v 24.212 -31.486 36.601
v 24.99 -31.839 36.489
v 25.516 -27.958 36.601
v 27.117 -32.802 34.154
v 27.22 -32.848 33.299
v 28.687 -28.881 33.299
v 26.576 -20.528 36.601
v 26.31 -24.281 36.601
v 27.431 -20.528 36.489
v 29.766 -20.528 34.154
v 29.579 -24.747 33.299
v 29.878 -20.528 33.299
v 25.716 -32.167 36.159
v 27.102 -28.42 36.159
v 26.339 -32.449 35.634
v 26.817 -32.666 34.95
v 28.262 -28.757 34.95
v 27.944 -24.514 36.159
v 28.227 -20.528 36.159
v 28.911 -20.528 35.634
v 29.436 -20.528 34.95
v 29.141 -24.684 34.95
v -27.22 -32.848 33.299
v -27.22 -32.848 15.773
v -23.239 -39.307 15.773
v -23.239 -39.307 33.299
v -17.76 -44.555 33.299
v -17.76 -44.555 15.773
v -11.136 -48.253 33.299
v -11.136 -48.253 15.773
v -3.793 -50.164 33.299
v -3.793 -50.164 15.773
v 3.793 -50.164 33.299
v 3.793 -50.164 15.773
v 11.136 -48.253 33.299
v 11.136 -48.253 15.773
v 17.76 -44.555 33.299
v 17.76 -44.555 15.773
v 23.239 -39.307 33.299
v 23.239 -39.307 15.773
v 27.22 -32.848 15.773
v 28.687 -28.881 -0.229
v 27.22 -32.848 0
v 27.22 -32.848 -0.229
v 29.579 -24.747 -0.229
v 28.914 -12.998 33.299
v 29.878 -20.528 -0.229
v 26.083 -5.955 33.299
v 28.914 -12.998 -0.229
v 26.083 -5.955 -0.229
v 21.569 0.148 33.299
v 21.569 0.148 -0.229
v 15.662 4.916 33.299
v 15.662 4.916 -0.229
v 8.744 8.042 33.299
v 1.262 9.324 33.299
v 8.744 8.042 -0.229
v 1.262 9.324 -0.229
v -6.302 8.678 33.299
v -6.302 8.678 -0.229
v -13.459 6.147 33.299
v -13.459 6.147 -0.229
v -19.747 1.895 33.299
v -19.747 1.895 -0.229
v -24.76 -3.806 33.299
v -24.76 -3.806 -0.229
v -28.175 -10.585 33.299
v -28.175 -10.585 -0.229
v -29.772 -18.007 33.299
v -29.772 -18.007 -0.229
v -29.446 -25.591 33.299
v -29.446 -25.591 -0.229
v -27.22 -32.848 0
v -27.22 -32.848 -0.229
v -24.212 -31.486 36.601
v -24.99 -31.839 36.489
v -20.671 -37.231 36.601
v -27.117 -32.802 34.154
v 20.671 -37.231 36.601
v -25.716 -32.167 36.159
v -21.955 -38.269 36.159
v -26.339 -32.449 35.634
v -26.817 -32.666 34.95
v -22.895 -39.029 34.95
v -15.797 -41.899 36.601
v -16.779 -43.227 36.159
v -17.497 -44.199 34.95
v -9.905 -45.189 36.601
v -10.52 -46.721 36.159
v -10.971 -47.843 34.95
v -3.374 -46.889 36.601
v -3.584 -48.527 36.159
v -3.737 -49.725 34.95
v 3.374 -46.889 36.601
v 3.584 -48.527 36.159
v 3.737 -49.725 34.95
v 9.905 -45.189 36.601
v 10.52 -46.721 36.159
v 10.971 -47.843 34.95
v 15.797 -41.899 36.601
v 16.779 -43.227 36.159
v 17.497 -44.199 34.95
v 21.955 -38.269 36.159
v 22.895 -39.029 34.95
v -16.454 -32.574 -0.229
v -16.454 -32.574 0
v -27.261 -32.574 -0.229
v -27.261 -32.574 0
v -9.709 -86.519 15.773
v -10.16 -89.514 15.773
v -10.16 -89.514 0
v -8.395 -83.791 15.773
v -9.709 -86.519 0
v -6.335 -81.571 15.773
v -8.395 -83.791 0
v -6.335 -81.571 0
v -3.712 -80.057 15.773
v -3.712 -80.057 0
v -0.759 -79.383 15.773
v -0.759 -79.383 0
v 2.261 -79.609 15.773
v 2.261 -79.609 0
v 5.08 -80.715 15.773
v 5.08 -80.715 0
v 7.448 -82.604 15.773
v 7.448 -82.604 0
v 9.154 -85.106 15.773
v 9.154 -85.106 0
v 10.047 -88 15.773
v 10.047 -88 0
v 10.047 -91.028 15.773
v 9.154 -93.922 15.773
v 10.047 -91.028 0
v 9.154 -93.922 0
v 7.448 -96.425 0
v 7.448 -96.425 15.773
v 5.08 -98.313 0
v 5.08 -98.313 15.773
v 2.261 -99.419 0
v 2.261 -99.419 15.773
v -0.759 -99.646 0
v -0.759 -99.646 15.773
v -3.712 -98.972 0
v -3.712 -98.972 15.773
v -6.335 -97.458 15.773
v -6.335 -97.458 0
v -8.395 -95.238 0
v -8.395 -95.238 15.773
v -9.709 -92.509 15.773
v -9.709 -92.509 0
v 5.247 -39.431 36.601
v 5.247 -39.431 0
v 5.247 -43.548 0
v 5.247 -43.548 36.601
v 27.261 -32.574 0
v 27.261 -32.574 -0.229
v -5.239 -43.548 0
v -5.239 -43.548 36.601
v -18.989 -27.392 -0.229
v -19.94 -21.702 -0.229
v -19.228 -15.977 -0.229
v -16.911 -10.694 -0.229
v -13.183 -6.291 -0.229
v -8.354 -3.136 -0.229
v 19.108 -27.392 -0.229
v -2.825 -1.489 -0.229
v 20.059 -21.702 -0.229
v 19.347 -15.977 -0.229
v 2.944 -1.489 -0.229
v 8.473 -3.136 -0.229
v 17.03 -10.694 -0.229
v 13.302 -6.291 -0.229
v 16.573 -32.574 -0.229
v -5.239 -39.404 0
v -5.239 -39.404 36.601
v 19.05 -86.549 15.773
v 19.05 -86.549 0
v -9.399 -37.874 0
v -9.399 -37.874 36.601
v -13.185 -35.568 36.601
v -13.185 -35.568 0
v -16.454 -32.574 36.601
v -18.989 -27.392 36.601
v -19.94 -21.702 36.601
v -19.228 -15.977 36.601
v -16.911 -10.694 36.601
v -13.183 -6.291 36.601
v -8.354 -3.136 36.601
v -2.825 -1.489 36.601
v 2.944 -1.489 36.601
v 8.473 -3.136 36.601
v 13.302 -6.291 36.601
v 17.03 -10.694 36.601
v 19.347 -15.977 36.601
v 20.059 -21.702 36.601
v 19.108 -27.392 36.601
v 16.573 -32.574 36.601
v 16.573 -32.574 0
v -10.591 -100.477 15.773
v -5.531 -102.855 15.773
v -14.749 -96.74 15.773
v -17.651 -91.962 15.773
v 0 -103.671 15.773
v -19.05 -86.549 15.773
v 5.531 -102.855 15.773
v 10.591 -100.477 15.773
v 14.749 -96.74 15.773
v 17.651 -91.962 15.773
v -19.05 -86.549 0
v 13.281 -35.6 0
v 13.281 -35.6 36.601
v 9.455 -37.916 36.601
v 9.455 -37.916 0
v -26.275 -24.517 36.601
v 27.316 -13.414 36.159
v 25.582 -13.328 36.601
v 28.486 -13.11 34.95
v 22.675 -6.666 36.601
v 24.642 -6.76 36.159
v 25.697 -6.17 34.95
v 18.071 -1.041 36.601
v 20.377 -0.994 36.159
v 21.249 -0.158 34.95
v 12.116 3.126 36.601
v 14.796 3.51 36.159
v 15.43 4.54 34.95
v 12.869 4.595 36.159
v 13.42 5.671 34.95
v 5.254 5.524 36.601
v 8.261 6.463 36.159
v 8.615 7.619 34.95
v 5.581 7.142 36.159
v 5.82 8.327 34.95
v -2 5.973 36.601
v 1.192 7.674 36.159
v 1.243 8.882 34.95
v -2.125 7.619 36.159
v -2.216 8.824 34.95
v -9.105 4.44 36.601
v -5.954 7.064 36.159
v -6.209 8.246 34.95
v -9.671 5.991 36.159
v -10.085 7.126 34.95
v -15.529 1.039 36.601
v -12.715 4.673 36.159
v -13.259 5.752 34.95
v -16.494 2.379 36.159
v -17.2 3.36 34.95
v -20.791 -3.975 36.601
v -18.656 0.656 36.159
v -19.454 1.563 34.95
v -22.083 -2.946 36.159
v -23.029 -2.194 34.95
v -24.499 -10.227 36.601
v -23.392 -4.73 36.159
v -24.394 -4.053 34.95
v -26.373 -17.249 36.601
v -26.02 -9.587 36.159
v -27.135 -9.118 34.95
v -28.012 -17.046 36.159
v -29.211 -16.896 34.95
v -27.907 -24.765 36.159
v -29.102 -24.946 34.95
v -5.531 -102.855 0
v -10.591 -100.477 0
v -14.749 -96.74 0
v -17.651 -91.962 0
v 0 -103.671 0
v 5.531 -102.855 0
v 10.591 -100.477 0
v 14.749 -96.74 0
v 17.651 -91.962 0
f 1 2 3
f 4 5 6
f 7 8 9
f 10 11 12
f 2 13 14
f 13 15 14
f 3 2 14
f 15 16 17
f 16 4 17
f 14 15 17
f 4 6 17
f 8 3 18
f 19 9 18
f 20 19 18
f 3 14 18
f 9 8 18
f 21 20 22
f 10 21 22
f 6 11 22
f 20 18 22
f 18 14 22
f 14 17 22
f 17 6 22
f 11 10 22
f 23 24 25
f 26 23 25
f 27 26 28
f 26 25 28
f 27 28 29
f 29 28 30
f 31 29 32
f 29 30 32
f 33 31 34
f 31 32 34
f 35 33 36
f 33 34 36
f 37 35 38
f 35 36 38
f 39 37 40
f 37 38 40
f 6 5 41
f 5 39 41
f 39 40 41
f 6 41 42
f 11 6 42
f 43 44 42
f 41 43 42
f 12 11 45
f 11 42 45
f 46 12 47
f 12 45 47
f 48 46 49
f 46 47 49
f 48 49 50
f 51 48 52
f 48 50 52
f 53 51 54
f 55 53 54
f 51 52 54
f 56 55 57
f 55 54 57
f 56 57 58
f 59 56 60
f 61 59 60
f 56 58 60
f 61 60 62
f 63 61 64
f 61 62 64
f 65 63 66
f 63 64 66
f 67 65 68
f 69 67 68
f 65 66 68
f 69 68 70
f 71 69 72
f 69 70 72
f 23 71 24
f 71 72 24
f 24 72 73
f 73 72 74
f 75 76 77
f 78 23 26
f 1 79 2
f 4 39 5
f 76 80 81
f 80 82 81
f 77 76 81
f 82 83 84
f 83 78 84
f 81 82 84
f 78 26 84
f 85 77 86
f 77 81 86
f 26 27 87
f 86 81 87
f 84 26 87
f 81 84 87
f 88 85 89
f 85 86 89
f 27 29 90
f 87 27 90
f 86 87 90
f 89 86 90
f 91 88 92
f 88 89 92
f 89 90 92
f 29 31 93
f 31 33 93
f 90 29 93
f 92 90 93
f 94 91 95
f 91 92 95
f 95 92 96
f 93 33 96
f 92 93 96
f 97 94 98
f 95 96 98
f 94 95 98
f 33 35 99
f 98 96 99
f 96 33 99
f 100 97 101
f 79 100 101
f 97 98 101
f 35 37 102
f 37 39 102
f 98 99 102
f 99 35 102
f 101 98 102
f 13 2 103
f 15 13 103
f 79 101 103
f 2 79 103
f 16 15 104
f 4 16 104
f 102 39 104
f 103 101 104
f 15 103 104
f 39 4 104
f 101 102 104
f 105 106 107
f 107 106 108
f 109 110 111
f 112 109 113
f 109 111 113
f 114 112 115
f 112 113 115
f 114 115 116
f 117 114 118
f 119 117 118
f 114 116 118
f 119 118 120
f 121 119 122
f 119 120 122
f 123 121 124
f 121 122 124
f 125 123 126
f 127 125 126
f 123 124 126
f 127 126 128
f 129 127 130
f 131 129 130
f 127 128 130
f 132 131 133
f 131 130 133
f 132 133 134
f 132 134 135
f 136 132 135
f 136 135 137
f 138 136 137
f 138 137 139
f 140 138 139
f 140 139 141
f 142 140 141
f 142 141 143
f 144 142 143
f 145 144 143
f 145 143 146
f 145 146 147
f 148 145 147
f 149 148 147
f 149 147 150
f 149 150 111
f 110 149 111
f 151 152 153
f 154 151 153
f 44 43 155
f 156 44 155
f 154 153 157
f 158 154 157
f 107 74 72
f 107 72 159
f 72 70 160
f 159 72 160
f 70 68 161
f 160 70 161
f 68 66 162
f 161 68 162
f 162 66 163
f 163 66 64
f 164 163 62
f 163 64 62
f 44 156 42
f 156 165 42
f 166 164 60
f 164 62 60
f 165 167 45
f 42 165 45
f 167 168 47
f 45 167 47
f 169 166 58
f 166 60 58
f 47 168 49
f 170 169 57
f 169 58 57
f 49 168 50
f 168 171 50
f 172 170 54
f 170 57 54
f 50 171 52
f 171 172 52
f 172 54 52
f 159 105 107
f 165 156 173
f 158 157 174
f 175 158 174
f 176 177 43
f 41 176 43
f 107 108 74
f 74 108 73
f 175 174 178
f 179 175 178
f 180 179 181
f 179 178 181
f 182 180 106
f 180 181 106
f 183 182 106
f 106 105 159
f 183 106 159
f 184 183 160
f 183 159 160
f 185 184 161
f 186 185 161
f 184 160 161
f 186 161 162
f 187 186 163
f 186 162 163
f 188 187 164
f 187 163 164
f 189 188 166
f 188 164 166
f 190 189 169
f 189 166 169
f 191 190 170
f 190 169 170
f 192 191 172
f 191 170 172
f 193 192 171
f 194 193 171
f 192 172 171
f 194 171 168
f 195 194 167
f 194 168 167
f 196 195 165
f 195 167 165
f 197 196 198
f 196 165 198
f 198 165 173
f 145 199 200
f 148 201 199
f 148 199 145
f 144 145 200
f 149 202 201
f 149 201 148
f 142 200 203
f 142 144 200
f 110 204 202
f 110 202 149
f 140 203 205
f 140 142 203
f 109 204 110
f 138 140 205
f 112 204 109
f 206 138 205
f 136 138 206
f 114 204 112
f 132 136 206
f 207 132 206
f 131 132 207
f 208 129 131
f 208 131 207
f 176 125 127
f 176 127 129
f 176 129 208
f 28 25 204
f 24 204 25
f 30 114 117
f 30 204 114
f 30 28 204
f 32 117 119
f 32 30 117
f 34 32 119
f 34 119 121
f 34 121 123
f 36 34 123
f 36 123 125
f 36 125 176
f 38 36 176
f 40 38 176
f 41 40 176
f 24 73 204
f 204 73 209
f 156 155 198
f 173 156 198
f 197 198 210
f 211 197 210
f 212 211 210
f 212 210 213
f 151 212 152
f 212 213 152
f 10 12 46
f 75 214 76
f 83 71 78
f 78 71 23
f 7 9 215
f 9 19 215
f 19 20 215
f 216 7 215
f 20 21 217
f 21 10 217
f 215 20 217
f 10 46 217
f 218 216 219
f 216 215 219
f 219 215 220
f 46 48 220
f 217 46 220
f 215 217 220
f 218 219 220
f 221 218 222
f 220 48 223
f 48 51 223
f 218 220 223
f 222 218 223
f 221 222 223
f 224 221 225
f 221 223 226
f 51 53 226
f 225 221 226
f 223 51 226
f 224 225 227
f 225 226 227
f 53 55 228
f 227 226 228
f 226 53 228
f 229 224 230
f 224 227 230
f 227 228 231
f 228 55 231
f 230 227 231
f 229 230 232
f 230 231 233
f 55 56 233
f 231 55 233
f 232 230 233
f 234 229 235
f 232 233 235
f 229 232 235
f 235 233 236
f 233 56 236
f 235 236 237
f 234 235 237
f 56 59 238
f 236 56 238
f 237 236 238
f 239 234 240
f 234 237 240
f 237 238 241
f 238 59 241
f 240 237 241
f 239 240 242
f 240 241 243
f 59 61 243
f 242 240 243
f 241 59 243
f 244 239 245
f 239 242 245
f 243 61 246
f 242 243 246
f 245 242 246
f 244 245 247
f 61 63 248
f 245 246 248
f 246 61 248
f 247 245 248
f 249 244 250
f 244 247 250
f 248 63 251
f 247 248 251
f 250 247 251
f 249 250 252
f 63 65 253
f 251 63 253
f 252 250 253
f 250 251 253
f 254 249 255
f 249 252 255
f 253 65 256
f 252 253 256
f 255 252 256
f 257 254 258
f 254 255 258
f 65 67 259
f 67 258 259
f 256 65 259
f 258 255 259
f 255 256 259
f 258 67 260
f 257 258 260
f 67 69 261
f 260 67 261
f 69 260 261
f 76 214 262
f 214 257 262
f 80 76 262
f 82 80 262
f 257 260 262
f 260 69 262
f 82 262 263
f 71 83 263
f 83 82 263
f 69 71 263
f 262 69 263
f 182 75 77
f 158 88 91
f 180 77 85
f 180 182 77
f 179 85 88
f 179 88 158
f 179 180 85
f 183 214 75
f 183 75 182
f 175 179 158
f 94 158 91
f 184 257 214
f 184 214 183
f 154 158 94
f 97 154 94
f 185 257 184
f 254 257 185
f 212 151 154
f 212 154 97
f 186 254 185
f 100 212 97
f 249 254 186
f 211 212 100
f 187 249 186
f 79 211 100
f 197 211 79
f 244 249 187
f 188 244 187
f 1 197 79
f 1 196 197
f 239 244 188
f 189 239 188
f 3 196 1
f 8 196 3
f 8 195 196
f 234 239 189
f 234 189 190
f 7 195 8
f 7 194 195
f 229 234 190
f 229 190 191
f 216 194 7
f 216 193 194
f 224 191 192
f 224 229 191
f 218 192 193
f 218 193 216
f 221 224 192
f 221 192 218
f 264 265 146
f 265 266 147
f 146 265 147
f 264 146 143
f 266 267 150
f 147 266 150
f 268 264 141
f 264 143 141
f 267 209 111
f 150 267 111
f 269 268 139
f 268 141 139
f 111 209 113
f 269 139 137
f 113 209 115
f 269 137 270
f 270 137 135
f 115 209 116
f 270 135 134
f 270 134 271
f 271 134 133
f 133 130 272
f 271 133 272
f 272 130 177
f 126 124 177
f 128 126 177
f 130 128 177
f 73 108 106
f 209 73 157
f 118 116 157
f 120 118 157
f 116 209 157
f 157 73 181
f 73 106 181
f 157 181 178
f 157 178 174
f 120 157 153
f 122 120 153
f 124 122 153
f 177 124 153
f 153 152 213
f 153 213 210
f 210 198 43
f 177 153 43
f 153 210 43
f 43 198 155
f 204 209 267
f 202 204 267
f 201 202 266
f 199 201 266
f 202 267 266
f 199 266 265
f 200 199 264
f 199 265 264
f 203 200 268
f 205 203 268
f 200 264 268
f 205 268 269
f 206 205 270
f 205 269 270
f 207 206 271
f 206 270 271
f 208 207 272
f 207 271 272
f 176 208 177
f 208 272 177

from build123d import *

# Parameters (mm, degrees)
F1_DEPTH = 15.7734
F3_D     = 20.32
F5_DEPTH = 20.828
F6_DEPTH = 16.002
F8_R     = 3.302
F9_DEPTH = 39.37


with BuildPart() as f1:
    # F0 (on Top) → F1 (new body)
    with BuildSketch(Plane.XY):
        with BuildLine():
            Line((27.2614864262, -32.5740104774), (-27.2614864262, -32.5740104774))
            Line((-27.2614864262, -32.5740104774), (-19.05, -86.5490104774))
            ThreePointArc((-19.05, -86.5490104774), (0, -103.6707926836), (19.05, -86.5490104774))
            Line((19.05, -86.5490104774), (27.2614864262, -32.5740104774))
        make_face()
    extrude(amount=F1_DEPTH)

    # F3 (through all)
    with Locations(Plane.XY.offset(15.7734)):
        with Locations((0, -89.5141884685)):
            Hole(F3_D / 2)

    # F4 (on face) → F5 (join)
    with BuildSketch(Plane.XY.offset(15.7734)):
        with BuildLine():
            ThreePointArc((27.2197921324, -32.8480716384), (29.2060026188, -26.8297481215), (29.8781534287, -20.5278862268))
            ThreePointArc((29.8781534287, -20.5278862268), (-6.3018618947, 8.678116392), (-27.2197921324, -32.8480716384))
            Line((-27.2197921324, -32.8480716384), (-27.2614864262, -32.5740104774))
            Line((-27.2614864262, -32.5740104774), (-16.4541315907, -32.5740104774))
            ThreePointArc((-16.4541315907, -32.5740104774), (0.0596223919, -1.2802406646), (16.5733763745, -32.5740104774))
            Line((16.5733763745, -32.5740104774), (27.2614864262, -32.5740104774))
            Line((27.2614864262, -32.5740104774), (27.2197921324, -32.8480716384))
        make_face()
        with BuildLine():
            Line((-27.2614864262, -32.5740104774), (-27.2197921324, -32.8480716384))
            ThreePointArc((-27.2197921324, -32.8480716384), (0, -50.4060396555), (27.2197921324, -32.8480716384))
            Line((27.2197921324, -32.8480716384), (27.2614864262, -32.5740104774))
            Line((27.2614864262, -32.5740104774), (16.5733763745, -32.5740104774))
            Line((16.5733763745, -32.5740104774), (-16.4541315907, -32.5740104774))
            Line((-16.4541315907, -32.5740104774), (-27.2614864262, -32.5740104774))
        make_face()
    extrude(amount=F5_DEPTH)

    # F6 (add): a face of the model
    f6_faces = [f1.faces().sort_by_distance(p)[0] for p in [
        (-21.8578090084, -31.8424699105, 15.7734),
    ]]
    extrude(f6_faces, amount=F6_DEPTH)

    # F8
    f8_edges = [f1.edges().sort_by_distance(p)[0] for p in [
        (-29.878153, -20.527886, 36.6014),
    ]]
    fillet(f8_edges, radius=F8_R)

    # F7 (on face) → F9 (cut)
    with BuildSketch(Plane(origin=(0, 0, 0), x_dir=(1, 0, 0), z_dir=(0, 0, -1))):
        with BuildLine():
            Line((-5.2386547938, 43.5478799045), (-5.2386547938, 39.4042106377))
            ThreePointArc((-5.2386547938, 39.4042106377), (-11.348132673, 36.8129879511), (-16.4541315907, 32.5740104774))
            Line((-16.4541315907, 32.5740104774), (16.5733763745, 32.5740104774))
            ThreePointArc((16.5733763745, 32.5740104774), (11.4254150287, 36.8533502525), (5.2473828261, 39.43136752))
            Line((5.2473828261, 39.43136752), (5.2473828261, 43.5478799045))
            Line((5.2473828261, 43.5478799045), (-5.2386547938, 43.5478799045))
        make_face()
    extrude(amount=-F9_DEPTH, mode=Mode.SUBTRACT)


solid = f1.part
